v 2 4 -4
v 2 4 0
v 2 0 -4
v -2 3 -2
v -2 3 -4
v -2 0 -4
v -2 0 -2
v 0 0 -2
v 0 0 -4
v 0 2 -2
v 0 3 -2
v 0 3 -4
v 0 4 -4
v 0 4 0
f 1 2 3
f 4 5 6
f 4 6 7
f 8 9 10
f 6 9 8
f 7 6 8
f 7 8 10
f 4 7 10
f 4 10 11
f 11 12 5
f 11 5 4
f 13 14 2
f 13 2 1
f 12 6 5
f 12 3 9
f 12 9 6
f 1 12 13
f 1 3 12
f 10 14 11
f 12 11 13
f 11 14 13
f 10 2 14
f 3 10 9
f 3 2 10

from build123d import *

# Parameters (mm, degrees)
SKETCH1_W           = 4
SKETCH1_H           = 4
BOSS_EXTRUDE1_DEPTH = 2
SKETCH2_W           = 2
SKETCH2_H           = 3
BOSS_EXTRUDE2_DEPTH = 2
CUT_EXTRUDE2_DEPTH  = 2


with BuildPart() as part:
    # Sketch1 → Boss-Extrude1 (new body)
    with BuildSketch(Plane(origin=(0, 0, 0), x_dir=(0, 0, -1), z_dir=(1, 0, 0))):
        with Locations((2, 2)):
            Rectangle(SKETCH1_W, SKETCH1_H)
    extrude(amount=BOSS_EXTRUDE1_DEPTH)

    # Sketch2 → Boss-Extrude2 (add)
    with BuildSketch(Plane.ZY):
        with Locations((-3, 1.5)):
            Rectangle(SKETCH2_W, SKETCH2_H)
    extrude(amount=BOSS_EXTRUDE2_DEPTH)

    # Sketch3 → Cut-Extrude2 (cut)
    with BuildSketch(Plane(origin=(2, 0, 0), x_dir=(0, 0, -1), z_dir=(1, 0, 0))):
        Polygon((0, 4), (4, 0), (0, 0), align=None)
    extrude(amount=-CUT_EXTRUDE2_DEPTH, mode=Mode.SUBTRACT)


solid = part.part
